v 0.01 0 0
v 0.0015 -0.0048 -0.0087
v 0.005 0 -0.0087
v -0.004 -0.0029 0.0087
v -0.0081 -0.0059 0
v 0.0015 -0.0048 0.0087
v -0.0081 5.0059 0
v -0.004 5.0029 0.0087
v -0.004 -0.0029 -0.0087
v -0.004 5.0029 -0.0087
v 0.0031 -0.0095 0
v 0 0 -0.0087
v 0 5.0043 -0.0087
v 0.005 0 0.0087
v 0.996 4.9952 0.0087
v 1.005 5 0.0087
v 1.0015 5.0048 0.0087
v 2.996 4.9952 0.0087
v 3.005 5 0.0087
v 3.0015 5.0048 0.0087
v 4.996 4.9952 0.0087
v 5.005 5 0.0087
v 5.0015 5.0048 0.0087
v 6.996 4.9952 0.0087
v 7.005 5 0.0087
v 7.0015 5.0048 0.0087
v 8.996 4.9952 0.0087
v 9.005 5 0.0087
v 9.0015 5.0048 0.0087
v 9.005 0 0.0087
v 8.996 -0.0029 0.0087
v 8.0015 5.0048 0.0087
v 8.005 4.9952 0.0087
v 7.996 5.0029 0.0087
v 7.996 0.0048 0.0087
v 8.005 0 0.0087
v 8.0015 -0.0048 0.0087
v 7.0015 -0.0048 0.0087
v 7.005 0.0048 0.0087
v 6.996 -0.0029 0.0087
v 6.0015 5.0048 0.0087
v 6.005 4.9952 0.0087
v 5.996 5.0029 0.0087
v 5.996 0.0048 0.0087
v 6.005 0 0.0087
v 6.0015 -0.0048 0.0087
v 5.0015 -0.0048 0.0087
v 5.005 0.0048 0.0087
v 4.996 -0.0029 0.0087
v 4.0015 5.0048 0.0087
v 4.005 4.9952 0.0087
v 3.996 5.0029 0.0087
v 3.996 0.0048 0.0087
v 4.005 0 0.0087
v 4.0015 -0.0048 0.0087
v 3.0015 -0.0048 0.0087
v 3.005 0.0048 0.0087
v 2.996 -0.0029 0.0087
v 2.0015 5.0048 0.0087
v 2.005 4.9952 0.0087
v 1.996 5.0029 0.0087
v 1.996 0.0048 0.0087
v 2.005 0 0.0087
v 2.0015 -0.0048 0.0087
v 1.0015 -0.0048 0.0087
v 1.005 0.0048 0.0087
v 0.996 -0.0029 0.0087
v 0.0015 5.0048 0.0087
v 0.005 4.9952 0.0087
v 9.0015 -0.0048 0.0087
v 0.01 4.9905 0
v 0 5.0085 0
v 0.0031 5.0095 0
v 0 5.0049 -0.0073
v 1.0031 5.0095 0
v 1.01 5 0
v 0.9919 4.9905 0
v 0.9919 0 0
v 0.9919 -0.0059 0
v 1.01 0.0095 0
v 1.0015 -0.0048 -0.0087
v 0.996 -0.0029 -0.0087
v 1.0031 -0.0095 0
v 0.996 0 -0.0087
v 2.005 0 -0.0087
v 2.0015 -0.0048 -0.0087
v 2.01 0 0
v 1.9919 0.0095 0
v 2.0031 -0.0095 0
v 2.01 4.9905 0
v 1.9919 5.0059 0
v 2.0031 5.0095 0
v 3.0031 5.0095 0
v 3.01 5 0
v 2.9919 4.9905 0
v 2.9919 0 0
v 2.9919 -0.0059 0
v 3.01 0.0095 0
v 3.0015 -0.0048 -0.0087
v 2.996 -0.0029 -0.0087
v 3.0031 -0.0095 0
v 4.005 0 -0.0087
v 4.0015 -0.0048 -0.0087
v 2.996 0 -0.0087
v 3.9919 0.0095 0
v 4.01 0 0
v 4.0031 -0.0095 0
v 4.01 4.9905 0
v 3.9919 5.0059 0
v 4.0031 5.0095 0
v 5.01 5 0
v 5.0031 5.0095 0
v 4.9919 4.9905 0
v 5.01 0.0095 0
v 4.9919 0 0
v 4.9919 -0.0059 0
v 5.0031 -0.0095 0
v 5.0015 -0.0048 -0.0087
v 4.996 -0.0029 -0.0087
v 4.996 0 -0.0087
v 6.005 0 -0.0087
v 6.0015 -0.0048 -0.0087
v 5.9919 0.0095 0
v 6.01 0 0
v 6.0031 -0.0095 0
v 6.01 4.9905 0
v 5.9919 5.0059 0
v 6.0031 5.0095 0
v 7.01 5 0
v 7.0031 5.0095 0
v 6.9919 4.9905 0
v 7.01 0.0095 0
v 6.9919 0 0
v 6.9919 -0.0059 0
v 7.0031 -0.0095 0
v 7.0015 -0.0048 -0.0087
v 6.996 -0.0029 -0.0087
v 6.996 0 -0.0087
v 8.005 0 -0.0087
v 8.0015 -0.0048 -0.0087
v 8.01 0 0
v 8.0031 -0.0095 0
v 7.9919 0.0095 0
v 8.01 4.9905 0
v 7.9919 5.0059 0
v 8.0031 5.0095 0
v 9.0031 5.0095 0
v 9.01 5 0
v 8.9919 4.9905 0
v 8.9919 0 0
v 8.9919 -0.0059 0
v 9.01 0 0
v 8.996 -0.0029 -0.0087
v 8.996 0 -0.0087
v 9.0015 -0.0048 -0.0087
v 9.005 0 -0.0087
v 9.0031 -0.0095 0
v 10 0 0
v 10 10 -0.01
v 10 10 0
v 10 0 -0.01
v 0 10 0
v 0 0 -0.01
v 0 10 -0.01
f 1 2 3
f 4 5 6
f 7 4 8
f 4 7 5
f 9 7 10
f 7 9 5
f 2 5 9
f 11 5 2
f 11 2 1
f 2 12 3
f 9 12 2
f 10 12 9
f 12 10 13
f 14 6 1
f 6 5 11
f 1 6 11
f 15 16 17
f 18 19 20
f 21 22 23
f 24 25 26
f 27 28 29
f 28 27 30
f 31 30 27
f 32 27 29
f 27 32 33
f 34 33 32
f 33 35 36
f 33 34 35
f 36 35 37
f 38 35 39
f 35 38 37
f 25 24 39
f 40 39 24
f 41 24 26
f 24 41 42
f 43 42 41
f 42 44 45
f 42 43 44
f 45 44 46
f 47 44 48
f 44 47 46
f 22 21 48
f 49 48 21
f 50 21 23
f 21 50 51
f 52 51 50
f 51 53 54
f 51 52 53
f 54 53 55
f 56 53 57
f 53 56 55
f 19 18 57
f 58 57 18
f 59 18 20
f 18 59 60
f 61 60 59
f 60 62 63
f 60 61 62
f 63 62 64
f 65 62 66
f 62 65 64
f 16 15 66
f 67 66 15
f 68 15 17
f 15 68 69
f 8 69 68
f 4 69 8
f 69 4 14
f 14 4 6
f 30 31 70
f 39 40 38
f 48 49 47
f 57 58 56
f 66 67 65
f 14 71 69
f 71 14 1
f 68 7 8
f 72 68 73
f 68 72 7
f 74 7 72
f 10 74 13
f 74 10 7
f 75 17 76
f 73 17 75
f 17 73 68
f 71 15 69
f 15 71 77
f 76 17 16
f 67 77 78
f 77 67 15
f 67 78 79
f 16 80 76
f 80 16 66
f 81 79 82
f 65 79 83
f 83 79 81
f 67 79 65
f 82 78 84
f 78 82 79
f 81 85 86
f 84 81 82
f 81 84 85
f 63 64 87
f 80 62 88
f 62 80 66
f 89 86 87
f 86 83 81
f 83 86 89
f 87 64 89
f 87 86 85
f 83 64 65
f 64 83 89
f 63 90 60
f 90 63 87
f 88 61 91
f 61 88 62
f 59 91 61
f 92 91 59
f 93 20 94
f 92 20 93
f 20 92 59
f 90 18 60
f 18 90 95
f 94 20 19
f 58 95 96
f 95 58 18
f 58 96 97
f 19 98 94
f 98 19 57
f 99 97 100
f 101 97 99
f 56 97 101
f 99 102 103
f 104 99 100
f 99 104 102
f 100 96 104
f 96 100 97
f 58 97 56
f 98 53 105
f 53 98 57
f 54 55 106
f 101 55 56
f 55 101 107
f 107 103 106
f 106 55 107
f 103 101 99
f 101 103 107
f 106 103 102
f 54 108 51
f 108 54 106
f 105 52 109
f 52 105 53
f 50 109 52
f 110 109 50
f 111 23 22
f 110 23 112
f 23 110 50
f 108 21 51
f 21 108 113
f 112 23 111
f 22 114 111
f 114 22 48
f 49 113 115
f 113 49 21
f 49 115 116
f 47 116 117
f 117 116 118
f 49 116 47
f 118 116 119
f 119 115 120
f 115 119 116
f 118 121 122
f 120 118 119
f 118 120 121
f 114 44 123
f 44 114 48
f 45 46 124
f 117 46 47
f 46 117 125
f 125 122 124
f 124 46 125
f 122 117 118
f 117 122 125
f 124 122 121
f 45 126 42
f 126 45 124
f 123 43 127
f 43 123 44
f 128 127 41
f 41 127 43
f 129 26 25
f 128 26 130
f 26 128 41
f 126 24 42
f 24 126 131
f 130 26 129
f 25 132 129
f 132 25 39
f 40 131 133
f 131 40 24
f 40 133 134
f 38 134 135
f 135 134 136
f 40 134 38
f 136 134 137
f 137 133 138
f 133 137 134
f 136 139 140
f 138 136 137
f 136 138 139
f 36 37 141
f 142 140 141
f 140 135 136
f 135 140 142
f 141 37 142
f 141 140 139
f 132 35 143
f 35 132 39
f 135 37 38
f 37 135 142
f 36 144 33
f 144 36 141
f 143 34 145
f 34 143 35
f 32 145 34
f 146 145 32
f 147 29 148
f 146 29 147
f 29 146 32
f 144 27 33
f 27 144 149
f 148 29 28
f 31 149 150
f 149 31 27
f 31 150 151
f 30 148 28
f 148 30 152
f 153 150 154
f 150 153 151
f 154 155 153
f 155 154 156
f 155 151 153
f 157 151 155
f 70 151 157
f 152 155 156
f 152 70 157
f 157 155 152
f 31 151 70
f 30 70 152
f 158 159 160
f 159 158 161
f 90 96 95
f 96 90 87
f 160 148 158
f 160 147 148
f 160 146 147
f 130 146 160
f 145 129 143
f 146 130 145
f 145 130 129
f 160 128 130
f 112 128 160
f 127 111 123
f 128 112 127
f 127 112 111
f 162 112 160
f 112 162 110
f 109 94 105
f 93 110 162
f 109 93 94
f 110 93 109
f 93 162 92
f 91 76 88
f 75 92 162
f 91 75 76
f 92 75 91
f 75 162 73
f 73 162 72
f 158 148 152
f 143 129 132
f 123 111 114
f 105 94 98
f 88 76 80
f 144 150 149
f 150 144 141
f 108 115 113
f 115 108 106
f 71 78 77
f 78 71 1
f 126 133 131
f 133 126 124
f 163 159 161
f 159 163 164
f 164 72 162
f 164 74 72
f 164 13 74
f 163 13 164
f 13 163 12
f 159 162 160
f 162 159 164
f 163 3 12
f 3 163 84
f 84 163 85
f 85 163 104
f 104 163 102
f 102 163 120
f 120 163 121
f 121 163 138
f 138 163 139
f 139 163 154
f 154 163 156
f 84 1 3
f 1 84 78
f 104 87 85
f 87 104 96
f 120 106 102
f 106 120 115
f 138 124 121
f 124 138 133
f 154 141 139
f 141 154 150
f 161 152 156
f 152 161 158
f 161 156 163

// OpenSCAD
hull(){
    translate([0, 0]) sphere(0.01);
    translate([0, 1]) sphere(0.01);
}
hull(){
    translate([0, 1]) sphere(0.01);
    translate([0, 2]) sphere(0.01);
}
hull(){
    translate([0, 2]) sphere(0.01);
    translate([0, 3]) sphere(0.01);
}
hull(){
    translate([0, 3]) sphere(0.01);
    translate([0, 4]) sphere(0.01);
}
hull(){
    translate([0, 4]) sphere(0.01);
    translate([0, 5]) sphere(0.01);
}
hull(){
    translate([0, 5]) sphere(0.01);
    translate([1, 5]) sphere(0.01);
}
hull(){
    translate([1, 5]) sphere(0.01);
    translate([1, 4]) sphere(0.01);
}
hull(){
    translate([1, 4]) sphere(0.01);
    translate([1, 3]) sphere(0.01);
}
hull(){
    translate([1, 3]) sphere(0.01);
    translate([1, 2]) sphere(0.01);
}
hull(){
    translate([1, 2]) sphere(0.01);
    translate([1, 1]) sphere(0.01);
}
hull(){
    translate([1, 1]) sphere(0.01);
    translate([1, 0]) sphere(0.01);
}
hull(){
    translate([1, 0]) sphere(0.01);
    translate([2, 0]) sphere(0.01);
}
hull(){
    translate([2, 0]) sphere(0.01);
    translate([2, 1]) sphere(0.01);
}
hull(){
    translate([2, 1]) sphere(0.01);
    translate([2, 2]) sphere(0.01);
}
hull(){
    translate([2, 2]) sphere(0.01);
    translate([2, 3]) sphere(0.01);
}
hull(){
    translate([2, 3]) sphere(0.01);
    translate([2, 4]) sphere(0.01);
}
hull(){
    translate([2, 4]) sphere(0.01);
    translate([2, 5]) sphere(0.01);
}
hull(){
    translate([2, 5]) sphere(0.01);
    translate([3, 5]) sphere(0.01);
}
hull(){
    translate([3, 5]) sphere(0.01);
    translate([3, 4]) sphere(0.01);
}
hull(){
    translate([3, 4]) sphere(0.01);
    translate([3, 3]) sphere(0.01);
}
hull(){
    translate([3, 3]) sphere(0.01);
    translate([3, 2]) sphere(0.01);
}
hull(){
    translate([3, 2]) sphere(0.01);
    translate([3, 1]) sphere(0.01);
}
hull(){
    translate([3, 1]) sphere(0.01);
    translate([3, 0]) sphere(0.01);
}
hull(){
    translate([3, 0]) sphere(0.01);
    translate([4, 0]) sphere(0.01);
}
hull(){
    translate([4, 0]) sphere(0.01);
    translate([4, 1]) sphere(0.01);
}
hull(){
    translate([4, 1]) sphere(0.01);
    translate([4, 2]) sphere(0.01);
}
hull(){
    translate([4, 2]) sphere(0.01);
    translate([4, 3]) sphere(0.01);
}
hull(){
    translate([4, 3]) sphere(0.01);
    translate([4, 4]) sphere(0.01);
}
hull(){
    translate([4, 4]) sphere(0.01);
    translate([4, 5]) sphere(0.01);
}
hull(){
    translate([4, 5]) sphere(0.01);
    translate([5, 5]) sphere(0.01);
}
hull(){
    translate([5, 5]) sphere(0.01);
    translate([5, 4]) sphere(0.01);
}
hull(){
    translate([5, 4]) sphere(0.01);
    translate([5, 3]) sphere(0.01);
}
hull(){
    translate([5, 3]) sphere(0.01);
    translate([5, 2]) sphere(0.01);
}
hull(){
    translate([5, 2]) sphere(0.01);
    translate([5, 1]) sphere(0.01);
}
hull(){
    translate([5, 1]) sphere(0.01);
    translate([5, 0]) sphere(0.01);
}
hull(){
    translate([5, 0]) sphere(0.01);
    translate([6, 0]) sphere(0.01);
}
hull(){
    translate([6, 0]) sphere(0.01);
    translate([6, 1]) sphere(0.01);
}
hull(){
    translate([6, 1]) sphere(0.01);
    translate([6, 2]) sphere(0.01);
}
hull(){
    translate([6, 2]) sphere(0.01);
    translate([6, 3]) sphere(0.01);
}
hull(){
    translate([6, 3]) sphere(0.01);
    translate([6, 4]) sphere(0.01);
}
hull(){
    translate([6, 4]) sphere(0.01);
    translate([6, 5]) sphere(0.01);
}
hull(){
    translate([6, 5]) sphere(0.01);
    translate([7, 5]) sphere(0.01);
}
hull(){
    translate([7, 5]) sphere(0.01);
    translate([7, 4]) sphere(0.01);
}
hull(){
    translate([7, 4]) sphere(0.01);
    translate([7, 3]) sphere(0.01);
}
hull(){
    translate([7, 3]) sphere(0.01);
    translate([7, 2]) sphere(0.01);
}
hull(){
    translate([7, 2]) sphere(0.01);
    translate([7, 1]) sphere(0.01);
}
hull(){
    translate([7, 1]) sphere(0.01);
    translate([7, 0]) sphere(0.01);
}
hull(){
    translate([7, 0]) sphere(0.01);
    translate([8, 0]) sphere(0.01);
}
hull(){
    translate([8, 0]) sphere(0.01);
    translate([8, 1]) sphere(0.01);
}
hull(){
    translate([8, 1]) sphere(0.01);
    translate([8, 2]) sphere(0.01);
}
hull(){
    translate([8, 2]) sphere(0.01);
    translate([8, 3]) sphere(0.01);
}
hull(){
    translate([8, 3]) sphere(0.01);
    translate([8, 4]) sphere(0.01);
}
hull(){
    translate([8, 4]) sphere(0.01);
    translate([8, 5]) sphere(0.01);
}
hull(){
    translate([8, 5]) sphere(0.01);
    translate([9, 5]) sphere(0.01);
}
hull(){
    translate([9, 5]) sphere(0.01);
    translate([9, 4]) sphere(0.01);
}
hull(){
    translate([9, 4]) sphere(0.01);
    translate([9, 3]) sphere(0.01);
}
hull(){
    translate([9, 3]) sphere(0.01);
    translate([9, 2]) sphere(0.01);
}
hull(){
    translate([9, 2]) sphere(0.01);
    translate([9, 1]) sphere(0.01);
}
hull(){
    translate([9, 1]) sphere(0.01);
    translate([9, 0]) sphere(0.01);
}
translate([0,0,-0.01]) color([0.1,0.1,0.1]) cube([10,10,0.01]);
